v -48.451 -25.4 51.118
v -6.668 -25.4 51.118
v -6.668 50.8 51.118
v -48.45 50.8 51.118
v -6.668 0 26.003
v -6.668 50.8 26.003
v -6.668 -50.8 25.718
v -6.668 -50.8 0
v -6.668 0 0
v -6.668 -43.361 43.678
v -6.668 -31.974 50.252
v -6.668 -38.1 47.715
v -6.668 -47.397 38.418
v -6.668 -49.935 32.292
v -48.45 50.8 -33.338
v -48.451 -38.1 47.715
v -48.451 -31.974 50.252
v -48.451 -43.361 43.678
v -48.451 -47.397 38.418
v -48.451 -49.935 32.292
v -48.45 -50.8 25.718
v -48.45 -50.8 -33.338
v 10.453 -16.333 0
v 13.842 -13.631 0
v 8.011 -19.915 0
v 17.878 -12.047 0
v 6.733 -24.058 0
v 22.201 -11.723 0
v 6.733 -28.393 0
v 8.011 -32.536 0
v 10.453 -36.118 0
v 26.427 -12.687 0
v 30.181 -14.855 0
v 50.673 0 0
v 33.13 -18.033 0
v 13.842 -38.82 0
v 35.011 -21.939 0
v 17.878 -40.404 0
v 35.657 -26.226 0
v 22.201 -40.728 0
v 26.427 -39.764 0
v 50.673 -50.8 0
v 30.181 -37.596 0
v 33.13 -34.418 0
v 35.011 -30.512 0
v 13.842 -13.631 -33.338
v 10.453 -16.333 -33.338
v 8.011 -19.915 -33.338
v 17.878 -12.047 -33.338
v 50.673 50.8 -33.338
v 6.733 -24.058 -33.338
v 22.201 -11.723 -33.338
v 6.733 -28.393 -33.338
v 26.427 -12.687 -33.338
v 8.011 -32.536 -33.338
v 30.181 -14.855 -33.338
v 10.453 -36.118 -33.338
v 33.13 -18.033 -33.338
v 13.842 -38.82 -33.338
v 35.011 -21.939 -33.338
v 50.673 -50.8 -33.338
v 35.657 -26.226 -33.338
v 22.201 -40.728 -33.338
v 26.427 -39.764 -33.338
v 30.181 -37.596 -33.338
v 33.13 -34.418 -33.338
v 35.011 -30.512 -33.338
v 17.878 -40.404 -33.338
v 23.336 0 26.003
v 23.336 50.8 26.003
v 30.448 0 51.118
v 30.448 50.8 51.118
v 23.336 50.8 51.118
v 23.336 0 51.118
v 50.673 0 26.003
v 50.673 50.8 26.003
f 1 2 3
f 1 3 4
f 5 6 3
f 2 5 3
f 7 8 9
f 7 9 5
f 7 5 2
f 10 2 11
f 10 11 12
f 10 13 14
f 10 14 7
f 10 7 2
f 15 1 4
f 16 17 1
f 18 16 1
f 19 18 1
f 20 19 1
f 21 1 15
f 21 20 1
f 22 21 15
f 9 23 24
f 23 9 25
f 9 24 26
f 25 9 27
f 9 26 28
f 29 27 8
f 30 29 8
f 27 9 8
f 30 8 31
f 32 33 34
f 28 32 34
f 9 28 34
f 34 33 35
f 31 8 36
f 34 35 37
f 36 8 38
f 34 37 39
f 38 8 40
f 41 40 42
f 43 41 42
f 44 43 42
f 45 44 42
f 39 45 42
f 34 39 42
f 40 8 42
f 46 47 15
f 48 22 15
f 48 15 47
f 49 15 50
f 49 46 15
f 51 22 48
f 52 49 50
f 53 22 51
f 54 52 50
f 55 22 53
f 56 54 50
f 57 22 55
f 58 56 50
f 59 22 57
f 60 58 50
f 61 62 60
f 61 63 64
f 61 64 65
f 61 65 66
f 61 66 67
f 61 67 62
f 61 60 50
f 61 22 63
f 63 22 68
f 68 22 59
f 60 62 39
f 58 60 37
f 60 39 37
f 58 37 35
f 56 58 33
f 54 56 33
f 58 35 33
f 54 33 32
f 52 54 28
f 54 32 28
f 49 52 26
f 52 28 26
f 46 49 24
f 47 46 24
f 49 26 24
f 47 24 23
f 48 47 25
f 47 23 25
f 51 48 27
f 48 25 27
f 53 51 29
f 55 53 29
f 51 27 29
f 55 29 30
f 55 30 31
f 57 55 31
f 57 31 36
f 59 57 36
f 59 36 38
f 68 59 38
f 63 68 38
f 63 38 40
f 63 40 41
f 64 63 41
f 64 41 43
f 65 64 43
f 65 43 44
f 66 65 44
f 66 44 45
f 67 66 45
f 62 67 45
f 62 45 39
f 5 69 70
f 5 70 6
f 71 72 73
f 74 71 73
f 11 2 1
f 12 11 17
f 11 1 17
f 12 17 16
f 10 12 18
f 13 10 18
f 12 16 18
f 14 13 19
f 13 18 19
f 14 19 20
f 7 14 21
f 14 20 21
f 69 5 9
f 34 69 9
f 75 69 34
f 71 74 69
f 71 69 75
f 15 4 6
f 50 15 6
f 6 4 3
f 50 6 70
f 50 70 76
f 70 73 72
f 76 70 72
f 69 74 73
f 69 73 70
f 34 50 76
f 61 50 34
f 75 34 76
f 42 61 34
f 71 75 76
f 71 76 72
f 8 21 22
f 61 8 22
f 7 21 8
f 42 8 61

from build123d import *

# Parameters (mm, degrees)
F1_DEPTH = 50.8
F3_DEPTH = 50.8
F4_R     = 25.4
F5_R     = 14.543371
F6_DEPTH = 33.3385


with BuildPart() as f1:
    # F0 (on Front) → F1 (new body, symmetric)
    with BuildSketch(Plane.XZ):
        Polygon((-48.4505, 51.117502), (-48.4505, -33.3375), (50.673001, -33.3375), (50.673001, 26.003249), (30.448252, 51.117502), (23.336248, 51.117502), (23.336248, 26.003249), (-6.6675, 26.003249), (-6.6675, 51.117502), align=None)
    extrude(amount=F1_DEPTH, both=True)

    # F2 (on face) → F3 (cut)
    with BuildSketch(Plane.XZ.offset(50.8)):
        Polygon((23.336248, 26.003249), (-6.6675, 26.003249), (-6.6675, 0), (50.673001, 0), (50.673001, 26.003249), (30.448252, 51.117502), (23.336248, 51.117502), align=None)
    extrude(amount=-F3_DEPTH, mode=Mode.SUBTRACT)

    # F4
    f4_edges = [f1.edges().sort_by_distance(p)[0] for p in [
        (-27.559, -50.8, 51.117502),
    ]]
    fillet(f4_edges, radius=F4_R)

    # F5 (on Top) → F6 (cut, through all)
    with BuildSketch(Plane.XY):
        with Locations((21.113751, -26.2255)):
            Circle(F5_R)
    extrude(amount=-F6_DEPTH, mode=Mode.SUBTRACT)


solid = f1.part
